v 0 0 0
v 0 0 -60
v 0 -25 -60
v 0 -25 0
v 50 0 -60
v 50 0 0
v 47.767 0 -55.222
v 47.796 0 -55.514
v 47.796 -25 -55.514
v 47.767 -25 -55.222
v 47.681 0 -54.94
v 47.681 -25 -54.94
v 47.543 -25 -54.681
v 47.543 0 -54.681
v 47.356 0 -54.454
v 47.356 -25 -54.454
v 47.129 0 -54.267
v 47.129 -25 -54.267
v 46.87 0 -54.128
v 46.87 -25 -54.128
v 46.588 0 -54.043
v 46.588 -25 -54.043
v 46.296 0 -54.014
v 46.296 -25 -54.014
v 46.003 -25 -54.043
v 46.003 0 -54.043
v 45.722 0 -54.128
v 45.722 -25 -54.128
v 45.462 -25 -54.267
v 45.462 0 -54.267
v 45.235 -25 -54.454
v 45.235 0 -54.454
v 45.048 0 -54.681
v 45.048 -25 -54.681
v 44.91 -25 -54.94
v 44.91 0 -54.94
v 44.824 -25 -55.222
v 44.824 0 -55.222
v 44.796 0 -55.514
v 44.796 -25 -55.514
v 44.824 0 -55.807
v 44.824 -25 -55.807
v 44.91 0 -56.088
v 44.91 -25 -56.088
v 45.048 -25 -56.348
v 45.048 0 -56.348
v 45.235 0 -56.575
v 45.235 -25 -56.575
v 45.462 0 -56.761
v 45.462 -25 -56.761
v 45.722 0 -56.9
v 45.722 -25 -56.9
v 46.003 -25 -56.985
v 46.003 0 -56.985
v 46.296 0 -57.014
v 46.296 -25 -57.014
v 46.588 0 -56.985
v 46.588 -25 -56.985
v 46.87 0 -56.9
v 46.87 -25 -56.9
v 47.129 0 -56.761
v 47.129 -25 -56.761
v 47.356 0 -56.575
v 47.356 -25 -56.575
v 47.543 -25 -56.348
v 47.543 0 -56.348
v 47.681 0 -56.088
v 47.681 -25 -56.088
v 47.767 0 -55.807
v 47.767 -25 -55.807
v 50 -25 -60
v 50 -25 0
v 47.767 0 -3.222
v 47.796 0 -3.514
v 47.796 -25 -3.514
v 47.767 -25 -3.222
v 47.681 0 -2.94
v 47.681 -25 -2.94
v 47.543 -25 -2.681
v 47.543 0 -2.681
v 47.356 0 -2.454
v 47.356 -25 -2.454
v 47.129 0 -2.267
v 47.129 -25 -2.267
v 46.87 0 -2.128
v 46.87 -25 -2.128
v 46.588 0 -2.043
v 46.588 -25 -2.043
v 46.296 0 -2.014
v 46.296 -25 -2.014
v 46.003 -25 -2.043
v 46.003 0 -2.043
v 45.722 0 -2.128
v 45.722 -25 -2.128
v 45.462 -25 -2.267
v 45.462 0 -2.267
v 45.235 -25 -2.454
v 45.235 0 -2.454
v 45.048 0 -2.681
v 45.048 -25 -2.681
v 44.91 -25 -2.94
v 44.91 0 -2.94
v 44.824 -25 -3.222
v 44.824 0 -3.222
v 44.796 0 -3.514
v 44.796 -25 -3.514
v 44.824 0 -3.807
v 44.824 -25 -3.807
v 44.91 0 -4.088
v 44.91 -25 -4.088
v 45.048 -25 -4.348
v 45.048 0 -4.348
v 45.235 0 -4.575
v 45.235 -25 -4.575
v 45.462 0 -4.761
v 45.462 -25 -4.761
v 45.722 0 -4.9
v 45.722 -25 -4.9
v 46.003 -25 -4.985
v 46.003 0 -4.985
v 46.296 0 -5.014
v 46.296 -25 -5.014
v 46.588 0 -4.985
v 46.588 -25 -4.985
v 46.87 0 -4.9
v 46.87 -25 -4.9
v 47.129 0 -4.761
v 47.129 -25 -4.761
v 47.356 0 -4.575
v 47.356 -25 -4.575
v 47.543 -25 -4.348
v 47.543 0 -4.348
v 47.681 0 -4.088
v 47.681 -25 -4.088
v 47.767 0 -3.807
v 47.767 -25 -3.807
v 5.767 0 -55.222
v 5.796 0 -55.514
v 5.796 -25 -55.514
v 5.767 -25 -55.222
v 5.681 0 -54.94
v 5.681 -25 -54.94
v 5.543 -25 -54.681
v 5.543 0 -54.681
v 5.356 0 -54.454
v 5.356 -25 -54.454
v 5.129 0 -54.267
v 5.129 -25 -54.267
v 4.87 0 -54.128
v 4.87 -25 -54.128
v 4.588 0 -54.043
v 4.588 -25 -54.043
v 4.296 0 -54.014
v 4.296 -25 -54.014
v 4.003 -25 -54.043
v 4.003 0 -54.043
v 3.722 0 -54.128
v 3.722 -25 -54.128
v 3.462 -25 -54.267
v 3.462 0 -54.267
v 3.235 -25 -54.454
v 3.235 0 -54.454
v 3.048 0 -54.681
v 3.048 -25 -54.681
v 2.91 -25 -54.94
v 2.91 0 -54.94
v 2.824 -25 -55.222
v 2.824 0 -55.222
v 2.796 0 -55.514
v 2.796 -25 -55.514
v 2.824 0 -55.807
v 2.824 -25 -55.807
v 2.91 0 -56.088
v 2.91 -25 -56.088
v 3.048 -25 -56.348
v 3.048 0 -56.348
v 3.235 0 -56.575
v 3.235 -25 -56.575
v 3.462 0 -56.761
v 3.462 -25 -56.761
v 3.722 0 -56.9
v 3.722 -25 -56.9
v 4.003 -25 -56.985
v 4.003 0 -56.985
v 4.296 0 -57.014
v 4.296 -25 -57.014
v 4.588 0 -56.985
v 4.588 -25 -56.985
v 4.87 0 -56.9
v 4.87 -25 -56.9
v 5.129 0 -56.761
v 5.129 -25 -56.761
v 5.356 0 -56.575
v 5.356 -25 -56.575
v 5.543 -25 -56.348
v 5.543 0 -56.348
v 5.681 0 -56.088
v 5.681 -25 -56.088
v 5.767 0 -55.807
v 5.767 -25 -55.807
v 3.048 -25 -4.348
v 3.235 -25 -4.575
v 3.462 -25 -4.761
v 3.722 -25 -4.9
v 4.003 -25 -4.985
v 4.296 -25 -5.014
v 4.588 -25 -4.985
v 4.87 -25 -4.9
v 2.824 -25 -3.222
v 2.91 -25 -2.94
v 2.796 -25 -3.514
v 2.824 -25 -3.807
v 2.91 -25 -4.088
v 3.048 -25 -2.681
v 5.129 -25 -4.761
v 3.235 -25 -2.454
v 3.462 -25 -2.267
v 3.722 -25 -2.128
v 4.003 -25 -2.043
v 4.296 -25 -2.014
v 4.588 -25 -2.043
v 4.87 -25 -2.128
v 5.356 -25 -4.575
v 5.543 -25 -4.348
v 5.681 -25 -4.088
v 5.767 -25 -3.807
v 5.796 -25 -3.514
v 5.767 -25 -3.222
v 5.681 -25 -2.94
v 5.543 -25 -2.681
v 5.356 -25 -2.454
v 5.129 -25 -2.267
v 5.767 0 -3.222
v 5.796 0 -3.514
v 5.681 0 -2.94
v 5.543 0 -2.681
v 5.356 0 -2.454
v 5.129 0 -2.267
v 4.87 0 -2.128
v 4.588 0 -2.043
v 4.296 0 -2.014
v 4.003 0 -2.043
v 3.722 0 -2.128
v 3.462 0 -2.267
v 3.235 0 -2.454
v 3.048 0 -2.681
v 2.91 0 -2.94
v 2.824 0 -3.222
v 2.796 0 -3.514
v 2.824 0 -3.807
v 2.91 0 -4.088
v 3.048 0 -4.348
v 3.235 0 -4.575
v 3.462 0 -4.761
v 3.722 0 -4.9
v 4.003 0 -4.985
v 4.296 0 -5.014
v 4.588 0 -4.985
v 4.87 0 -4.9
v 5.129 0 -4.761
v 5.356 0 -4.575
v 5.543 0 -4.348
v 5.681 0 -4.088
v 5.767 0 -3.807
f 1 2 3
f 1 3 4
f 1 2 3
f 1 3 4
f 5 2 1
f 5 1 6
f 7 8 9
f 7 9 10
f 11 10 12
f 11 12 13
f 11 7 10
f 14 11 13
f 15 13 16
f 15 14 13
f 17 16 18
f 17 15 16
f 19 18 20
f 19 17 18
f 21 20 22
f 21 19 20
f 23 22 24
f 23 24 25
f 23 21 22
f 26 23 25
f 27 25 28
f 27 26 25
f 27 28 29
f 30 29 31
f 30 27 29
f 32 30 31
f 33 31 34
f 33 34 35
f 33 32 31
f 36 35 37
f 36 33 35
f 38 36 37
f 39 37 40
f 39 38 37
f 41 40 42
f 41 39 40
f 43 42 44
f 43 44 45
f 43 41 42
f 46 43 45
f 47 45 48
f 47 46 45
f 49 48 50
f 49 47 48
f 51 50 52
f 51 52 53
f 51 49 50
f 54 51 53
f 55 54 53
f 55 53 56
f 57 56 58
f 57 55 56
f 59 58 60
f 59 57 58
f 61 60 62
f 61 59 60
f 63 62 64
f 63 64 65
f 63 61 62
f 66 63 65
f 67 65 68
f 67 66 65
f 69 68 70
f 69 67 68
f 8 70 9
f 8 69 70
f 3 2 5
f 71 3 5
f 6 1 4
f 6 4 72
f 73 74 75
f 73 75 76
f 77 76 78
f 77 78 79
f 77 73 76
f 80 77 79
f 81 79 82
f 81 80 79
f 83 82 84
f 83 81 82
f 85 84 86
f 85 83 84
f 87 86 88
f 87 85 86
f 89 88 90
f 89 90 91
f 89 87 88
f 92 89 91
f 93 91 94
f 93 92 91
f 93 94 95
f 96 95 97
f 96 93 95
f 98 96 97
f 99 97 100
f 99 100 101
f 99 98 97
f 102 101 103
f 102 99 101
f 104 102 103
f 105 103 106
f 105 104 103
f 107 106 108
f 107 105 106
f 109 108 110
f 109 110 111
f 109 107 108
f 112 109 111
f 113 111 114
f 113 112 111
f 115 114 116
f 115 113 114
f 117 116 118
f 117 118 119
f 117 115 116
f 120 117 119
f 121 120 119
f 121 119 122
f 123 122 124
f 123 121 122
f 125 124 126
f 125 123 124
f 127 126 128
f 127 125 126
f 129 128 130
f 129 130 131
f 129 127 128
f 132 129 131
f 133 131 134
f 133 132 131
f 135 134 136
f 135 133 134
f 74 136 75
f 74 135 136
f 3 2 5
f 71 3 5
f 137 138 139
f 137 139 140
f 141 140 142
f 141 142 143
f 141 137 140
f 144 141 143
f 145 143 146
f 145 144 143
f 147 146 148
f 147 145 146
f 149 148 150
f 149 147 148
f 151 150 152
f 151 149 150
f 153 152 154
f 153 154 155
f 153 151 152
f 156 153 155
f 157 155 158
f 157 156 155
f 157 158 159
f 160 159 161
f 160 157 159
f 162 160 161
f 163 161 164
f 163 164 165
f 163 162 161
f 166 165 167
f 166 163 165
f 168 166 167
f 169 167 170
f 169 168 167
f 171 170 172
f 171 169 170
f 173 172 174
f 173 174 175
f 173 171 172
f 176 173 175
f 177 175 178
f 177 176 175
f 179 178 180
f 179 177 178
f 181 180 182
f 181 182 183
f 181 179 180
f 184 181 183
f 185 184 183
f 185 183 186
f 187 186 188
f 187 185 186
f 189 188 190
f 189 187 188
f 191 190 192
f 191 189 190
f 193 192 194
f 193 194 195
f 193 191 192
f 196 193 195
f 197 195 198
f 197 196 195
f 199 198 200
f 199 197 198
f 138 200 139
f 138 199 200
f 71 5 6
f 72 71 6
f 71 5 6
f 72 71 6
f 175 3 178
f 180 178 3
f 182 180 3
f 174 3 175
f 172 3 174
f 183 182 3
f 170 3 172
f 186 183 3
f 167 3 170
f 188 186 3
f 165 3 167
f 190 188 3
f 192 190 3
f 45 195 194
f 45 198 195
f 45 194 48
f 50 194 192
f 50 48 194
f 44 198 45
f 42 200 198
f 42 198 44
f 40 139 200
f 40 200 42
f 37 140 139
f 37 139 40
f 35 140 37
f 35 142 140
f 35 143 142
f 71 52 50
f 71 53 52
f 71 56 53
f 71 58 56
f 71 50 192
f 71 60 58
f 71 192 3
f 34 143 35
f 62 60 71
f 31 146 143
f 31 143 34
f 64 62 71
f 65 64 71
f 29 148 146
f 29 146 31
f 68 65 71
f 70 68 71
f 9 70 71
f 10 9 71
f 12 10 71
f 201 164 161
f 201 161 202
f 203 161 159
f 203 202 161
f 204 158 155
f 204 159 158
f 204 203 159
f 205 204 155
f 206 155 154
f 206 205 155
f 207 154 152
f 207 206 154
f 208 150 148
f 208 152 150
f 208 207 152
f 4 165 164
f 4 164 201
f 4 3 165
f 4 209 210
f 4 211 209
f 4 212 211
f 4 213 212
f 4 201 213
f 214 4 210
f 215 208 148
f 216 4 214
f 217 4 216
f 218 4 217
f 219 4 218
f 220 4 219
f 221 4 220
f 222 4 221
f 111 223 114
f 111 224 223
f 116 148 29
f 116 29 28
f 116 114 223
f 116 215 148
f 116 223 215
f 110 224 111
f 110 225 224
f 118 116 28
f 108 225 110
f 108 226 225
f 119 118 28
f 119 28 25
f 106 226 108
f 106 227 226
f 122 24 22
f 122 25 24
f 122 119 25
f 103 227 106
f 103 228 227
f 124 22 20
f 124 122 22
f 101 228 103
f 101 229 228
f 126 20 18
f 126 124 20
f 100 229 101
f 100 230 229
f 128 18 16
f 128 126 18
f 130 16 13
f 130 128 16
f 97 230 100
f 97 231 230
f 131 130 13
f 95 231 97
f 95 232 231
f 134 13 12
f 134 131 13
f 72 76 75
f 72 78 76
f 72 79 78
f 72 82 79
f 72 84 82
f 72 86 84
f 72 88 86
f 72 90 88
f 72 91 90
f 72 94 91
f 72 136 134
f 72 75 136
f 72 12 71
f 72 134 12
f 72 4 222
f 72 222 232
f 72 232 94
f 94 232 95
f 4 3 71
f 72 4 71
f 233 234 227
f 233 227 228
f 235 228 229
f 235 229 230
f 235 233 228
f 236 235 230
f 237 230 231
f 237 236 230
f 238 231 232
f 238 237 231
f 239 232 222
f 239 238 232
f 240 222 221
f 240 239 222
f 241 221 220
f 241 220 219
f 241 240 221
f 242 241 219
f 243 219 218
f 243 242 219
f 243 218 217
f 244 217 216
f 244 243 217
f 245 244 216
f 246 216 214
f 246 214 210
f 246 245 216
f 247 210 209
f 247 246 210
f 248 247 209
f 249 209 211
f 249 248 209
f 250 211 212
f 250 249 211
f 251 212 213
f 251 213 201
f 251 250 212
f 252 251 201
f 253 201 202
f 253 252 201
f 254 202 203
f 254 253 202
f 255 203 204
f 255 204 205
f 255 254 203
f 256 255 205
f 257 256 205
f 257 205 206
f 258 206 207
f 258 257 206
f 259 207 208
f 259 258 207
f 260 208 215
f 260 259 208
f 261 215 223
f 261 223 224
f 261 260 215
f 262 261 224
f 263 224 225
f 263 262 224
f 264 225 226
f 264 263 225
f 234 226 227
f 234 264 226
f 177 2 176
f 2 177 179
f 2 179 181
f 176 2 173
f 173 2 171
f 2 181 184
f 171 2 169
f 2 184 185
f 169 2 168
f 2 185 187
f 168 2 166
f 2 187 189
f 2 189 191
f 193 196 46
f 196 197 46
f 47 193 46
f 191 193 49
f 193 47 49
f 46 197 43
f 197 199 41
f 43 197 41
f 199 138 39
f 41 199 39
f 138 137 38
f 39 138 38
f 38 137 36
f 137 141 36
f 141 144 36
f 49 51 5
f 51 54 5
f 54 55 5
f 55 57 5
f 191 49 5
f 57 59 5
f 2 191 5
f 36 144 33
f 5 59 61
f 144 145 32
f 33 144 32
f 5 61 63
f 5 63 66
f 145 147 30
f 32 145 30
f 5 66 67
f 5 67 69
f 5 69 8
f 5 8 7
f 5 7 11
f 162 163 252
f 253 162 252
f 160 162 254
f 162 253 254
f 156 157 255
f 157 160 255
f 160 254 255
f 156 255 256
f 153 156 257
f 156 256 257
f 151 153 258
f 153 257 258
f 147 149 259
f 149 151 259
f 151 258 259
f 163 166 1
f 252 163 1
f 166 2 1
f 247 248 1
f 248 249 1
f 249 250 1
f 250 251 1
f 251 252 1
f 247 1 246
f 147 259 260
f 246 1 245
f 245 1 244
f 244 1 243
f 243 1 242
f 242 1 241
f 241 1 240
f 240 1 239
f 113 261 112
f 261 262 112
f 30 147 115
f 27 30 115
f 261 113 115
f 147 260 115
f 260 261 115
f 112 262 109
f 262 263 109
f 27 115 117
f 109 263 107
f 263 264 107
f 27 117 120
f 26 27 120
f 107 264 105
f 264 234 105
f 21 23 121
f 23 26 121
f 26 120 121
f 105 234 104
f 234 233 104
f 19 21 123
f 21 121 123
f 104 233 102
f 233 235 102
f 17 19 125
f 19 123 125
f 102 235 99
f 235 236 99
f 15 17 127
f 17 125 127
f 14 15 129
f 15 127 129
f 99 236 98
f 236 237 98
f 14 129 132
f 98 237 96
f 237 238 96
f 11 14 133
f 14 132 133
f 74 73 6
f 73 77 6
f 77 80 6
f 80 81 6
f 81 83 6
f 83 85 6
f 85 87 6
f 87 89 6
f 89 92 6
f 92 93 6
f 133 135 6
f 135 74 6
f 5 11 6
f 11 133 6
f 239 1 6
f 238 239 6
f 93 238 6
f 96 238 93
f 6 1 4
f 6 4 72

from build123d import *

# Parameters (mm, degrees)
F0_W     = 50
F0_H     = 60
F2_DEPTH = 25
F1_W     = 50
F1_H     = 60
F1_R     = 1.5


with BuildPart() as f2:
    # F0 (on Front) → F2 (new body)
    with BuildSketch(Plane.XZ):
        with Locations((25, -30)):
            Rectangle(F0_W, F0_H)
    extrude(amount=F2_DEPTH)


with BuildPart() as f2b:
    # F1 (on face) → F2, piece 2 (new body)
    with BuildSketch(Plane.XZ):
        with Locations((25, -30)):
            Rectangle(F1_W, F1_H)
        with Locations((4.2955388278, -55.5142813411)):
            Circle(F1_R, mode=Mode.SUBTRACT)
        with Locations((46.2955388278, -55.5142813411)):
            Circle(F1_R, mode=Mode.SUBTRACT)
        with Locations((4.2955388278, -3.5142813411)):
            Circle(F1_R, mode=Mode.SUBTRACT)
        with Locations((46.2955388278, -3.5142813411)):
            Circle(F1_R, mode=Mode.SUBTRACT)
    extrude(amount=F2_DEPTH)


solid = Compound([f2.part, f2b.part])
